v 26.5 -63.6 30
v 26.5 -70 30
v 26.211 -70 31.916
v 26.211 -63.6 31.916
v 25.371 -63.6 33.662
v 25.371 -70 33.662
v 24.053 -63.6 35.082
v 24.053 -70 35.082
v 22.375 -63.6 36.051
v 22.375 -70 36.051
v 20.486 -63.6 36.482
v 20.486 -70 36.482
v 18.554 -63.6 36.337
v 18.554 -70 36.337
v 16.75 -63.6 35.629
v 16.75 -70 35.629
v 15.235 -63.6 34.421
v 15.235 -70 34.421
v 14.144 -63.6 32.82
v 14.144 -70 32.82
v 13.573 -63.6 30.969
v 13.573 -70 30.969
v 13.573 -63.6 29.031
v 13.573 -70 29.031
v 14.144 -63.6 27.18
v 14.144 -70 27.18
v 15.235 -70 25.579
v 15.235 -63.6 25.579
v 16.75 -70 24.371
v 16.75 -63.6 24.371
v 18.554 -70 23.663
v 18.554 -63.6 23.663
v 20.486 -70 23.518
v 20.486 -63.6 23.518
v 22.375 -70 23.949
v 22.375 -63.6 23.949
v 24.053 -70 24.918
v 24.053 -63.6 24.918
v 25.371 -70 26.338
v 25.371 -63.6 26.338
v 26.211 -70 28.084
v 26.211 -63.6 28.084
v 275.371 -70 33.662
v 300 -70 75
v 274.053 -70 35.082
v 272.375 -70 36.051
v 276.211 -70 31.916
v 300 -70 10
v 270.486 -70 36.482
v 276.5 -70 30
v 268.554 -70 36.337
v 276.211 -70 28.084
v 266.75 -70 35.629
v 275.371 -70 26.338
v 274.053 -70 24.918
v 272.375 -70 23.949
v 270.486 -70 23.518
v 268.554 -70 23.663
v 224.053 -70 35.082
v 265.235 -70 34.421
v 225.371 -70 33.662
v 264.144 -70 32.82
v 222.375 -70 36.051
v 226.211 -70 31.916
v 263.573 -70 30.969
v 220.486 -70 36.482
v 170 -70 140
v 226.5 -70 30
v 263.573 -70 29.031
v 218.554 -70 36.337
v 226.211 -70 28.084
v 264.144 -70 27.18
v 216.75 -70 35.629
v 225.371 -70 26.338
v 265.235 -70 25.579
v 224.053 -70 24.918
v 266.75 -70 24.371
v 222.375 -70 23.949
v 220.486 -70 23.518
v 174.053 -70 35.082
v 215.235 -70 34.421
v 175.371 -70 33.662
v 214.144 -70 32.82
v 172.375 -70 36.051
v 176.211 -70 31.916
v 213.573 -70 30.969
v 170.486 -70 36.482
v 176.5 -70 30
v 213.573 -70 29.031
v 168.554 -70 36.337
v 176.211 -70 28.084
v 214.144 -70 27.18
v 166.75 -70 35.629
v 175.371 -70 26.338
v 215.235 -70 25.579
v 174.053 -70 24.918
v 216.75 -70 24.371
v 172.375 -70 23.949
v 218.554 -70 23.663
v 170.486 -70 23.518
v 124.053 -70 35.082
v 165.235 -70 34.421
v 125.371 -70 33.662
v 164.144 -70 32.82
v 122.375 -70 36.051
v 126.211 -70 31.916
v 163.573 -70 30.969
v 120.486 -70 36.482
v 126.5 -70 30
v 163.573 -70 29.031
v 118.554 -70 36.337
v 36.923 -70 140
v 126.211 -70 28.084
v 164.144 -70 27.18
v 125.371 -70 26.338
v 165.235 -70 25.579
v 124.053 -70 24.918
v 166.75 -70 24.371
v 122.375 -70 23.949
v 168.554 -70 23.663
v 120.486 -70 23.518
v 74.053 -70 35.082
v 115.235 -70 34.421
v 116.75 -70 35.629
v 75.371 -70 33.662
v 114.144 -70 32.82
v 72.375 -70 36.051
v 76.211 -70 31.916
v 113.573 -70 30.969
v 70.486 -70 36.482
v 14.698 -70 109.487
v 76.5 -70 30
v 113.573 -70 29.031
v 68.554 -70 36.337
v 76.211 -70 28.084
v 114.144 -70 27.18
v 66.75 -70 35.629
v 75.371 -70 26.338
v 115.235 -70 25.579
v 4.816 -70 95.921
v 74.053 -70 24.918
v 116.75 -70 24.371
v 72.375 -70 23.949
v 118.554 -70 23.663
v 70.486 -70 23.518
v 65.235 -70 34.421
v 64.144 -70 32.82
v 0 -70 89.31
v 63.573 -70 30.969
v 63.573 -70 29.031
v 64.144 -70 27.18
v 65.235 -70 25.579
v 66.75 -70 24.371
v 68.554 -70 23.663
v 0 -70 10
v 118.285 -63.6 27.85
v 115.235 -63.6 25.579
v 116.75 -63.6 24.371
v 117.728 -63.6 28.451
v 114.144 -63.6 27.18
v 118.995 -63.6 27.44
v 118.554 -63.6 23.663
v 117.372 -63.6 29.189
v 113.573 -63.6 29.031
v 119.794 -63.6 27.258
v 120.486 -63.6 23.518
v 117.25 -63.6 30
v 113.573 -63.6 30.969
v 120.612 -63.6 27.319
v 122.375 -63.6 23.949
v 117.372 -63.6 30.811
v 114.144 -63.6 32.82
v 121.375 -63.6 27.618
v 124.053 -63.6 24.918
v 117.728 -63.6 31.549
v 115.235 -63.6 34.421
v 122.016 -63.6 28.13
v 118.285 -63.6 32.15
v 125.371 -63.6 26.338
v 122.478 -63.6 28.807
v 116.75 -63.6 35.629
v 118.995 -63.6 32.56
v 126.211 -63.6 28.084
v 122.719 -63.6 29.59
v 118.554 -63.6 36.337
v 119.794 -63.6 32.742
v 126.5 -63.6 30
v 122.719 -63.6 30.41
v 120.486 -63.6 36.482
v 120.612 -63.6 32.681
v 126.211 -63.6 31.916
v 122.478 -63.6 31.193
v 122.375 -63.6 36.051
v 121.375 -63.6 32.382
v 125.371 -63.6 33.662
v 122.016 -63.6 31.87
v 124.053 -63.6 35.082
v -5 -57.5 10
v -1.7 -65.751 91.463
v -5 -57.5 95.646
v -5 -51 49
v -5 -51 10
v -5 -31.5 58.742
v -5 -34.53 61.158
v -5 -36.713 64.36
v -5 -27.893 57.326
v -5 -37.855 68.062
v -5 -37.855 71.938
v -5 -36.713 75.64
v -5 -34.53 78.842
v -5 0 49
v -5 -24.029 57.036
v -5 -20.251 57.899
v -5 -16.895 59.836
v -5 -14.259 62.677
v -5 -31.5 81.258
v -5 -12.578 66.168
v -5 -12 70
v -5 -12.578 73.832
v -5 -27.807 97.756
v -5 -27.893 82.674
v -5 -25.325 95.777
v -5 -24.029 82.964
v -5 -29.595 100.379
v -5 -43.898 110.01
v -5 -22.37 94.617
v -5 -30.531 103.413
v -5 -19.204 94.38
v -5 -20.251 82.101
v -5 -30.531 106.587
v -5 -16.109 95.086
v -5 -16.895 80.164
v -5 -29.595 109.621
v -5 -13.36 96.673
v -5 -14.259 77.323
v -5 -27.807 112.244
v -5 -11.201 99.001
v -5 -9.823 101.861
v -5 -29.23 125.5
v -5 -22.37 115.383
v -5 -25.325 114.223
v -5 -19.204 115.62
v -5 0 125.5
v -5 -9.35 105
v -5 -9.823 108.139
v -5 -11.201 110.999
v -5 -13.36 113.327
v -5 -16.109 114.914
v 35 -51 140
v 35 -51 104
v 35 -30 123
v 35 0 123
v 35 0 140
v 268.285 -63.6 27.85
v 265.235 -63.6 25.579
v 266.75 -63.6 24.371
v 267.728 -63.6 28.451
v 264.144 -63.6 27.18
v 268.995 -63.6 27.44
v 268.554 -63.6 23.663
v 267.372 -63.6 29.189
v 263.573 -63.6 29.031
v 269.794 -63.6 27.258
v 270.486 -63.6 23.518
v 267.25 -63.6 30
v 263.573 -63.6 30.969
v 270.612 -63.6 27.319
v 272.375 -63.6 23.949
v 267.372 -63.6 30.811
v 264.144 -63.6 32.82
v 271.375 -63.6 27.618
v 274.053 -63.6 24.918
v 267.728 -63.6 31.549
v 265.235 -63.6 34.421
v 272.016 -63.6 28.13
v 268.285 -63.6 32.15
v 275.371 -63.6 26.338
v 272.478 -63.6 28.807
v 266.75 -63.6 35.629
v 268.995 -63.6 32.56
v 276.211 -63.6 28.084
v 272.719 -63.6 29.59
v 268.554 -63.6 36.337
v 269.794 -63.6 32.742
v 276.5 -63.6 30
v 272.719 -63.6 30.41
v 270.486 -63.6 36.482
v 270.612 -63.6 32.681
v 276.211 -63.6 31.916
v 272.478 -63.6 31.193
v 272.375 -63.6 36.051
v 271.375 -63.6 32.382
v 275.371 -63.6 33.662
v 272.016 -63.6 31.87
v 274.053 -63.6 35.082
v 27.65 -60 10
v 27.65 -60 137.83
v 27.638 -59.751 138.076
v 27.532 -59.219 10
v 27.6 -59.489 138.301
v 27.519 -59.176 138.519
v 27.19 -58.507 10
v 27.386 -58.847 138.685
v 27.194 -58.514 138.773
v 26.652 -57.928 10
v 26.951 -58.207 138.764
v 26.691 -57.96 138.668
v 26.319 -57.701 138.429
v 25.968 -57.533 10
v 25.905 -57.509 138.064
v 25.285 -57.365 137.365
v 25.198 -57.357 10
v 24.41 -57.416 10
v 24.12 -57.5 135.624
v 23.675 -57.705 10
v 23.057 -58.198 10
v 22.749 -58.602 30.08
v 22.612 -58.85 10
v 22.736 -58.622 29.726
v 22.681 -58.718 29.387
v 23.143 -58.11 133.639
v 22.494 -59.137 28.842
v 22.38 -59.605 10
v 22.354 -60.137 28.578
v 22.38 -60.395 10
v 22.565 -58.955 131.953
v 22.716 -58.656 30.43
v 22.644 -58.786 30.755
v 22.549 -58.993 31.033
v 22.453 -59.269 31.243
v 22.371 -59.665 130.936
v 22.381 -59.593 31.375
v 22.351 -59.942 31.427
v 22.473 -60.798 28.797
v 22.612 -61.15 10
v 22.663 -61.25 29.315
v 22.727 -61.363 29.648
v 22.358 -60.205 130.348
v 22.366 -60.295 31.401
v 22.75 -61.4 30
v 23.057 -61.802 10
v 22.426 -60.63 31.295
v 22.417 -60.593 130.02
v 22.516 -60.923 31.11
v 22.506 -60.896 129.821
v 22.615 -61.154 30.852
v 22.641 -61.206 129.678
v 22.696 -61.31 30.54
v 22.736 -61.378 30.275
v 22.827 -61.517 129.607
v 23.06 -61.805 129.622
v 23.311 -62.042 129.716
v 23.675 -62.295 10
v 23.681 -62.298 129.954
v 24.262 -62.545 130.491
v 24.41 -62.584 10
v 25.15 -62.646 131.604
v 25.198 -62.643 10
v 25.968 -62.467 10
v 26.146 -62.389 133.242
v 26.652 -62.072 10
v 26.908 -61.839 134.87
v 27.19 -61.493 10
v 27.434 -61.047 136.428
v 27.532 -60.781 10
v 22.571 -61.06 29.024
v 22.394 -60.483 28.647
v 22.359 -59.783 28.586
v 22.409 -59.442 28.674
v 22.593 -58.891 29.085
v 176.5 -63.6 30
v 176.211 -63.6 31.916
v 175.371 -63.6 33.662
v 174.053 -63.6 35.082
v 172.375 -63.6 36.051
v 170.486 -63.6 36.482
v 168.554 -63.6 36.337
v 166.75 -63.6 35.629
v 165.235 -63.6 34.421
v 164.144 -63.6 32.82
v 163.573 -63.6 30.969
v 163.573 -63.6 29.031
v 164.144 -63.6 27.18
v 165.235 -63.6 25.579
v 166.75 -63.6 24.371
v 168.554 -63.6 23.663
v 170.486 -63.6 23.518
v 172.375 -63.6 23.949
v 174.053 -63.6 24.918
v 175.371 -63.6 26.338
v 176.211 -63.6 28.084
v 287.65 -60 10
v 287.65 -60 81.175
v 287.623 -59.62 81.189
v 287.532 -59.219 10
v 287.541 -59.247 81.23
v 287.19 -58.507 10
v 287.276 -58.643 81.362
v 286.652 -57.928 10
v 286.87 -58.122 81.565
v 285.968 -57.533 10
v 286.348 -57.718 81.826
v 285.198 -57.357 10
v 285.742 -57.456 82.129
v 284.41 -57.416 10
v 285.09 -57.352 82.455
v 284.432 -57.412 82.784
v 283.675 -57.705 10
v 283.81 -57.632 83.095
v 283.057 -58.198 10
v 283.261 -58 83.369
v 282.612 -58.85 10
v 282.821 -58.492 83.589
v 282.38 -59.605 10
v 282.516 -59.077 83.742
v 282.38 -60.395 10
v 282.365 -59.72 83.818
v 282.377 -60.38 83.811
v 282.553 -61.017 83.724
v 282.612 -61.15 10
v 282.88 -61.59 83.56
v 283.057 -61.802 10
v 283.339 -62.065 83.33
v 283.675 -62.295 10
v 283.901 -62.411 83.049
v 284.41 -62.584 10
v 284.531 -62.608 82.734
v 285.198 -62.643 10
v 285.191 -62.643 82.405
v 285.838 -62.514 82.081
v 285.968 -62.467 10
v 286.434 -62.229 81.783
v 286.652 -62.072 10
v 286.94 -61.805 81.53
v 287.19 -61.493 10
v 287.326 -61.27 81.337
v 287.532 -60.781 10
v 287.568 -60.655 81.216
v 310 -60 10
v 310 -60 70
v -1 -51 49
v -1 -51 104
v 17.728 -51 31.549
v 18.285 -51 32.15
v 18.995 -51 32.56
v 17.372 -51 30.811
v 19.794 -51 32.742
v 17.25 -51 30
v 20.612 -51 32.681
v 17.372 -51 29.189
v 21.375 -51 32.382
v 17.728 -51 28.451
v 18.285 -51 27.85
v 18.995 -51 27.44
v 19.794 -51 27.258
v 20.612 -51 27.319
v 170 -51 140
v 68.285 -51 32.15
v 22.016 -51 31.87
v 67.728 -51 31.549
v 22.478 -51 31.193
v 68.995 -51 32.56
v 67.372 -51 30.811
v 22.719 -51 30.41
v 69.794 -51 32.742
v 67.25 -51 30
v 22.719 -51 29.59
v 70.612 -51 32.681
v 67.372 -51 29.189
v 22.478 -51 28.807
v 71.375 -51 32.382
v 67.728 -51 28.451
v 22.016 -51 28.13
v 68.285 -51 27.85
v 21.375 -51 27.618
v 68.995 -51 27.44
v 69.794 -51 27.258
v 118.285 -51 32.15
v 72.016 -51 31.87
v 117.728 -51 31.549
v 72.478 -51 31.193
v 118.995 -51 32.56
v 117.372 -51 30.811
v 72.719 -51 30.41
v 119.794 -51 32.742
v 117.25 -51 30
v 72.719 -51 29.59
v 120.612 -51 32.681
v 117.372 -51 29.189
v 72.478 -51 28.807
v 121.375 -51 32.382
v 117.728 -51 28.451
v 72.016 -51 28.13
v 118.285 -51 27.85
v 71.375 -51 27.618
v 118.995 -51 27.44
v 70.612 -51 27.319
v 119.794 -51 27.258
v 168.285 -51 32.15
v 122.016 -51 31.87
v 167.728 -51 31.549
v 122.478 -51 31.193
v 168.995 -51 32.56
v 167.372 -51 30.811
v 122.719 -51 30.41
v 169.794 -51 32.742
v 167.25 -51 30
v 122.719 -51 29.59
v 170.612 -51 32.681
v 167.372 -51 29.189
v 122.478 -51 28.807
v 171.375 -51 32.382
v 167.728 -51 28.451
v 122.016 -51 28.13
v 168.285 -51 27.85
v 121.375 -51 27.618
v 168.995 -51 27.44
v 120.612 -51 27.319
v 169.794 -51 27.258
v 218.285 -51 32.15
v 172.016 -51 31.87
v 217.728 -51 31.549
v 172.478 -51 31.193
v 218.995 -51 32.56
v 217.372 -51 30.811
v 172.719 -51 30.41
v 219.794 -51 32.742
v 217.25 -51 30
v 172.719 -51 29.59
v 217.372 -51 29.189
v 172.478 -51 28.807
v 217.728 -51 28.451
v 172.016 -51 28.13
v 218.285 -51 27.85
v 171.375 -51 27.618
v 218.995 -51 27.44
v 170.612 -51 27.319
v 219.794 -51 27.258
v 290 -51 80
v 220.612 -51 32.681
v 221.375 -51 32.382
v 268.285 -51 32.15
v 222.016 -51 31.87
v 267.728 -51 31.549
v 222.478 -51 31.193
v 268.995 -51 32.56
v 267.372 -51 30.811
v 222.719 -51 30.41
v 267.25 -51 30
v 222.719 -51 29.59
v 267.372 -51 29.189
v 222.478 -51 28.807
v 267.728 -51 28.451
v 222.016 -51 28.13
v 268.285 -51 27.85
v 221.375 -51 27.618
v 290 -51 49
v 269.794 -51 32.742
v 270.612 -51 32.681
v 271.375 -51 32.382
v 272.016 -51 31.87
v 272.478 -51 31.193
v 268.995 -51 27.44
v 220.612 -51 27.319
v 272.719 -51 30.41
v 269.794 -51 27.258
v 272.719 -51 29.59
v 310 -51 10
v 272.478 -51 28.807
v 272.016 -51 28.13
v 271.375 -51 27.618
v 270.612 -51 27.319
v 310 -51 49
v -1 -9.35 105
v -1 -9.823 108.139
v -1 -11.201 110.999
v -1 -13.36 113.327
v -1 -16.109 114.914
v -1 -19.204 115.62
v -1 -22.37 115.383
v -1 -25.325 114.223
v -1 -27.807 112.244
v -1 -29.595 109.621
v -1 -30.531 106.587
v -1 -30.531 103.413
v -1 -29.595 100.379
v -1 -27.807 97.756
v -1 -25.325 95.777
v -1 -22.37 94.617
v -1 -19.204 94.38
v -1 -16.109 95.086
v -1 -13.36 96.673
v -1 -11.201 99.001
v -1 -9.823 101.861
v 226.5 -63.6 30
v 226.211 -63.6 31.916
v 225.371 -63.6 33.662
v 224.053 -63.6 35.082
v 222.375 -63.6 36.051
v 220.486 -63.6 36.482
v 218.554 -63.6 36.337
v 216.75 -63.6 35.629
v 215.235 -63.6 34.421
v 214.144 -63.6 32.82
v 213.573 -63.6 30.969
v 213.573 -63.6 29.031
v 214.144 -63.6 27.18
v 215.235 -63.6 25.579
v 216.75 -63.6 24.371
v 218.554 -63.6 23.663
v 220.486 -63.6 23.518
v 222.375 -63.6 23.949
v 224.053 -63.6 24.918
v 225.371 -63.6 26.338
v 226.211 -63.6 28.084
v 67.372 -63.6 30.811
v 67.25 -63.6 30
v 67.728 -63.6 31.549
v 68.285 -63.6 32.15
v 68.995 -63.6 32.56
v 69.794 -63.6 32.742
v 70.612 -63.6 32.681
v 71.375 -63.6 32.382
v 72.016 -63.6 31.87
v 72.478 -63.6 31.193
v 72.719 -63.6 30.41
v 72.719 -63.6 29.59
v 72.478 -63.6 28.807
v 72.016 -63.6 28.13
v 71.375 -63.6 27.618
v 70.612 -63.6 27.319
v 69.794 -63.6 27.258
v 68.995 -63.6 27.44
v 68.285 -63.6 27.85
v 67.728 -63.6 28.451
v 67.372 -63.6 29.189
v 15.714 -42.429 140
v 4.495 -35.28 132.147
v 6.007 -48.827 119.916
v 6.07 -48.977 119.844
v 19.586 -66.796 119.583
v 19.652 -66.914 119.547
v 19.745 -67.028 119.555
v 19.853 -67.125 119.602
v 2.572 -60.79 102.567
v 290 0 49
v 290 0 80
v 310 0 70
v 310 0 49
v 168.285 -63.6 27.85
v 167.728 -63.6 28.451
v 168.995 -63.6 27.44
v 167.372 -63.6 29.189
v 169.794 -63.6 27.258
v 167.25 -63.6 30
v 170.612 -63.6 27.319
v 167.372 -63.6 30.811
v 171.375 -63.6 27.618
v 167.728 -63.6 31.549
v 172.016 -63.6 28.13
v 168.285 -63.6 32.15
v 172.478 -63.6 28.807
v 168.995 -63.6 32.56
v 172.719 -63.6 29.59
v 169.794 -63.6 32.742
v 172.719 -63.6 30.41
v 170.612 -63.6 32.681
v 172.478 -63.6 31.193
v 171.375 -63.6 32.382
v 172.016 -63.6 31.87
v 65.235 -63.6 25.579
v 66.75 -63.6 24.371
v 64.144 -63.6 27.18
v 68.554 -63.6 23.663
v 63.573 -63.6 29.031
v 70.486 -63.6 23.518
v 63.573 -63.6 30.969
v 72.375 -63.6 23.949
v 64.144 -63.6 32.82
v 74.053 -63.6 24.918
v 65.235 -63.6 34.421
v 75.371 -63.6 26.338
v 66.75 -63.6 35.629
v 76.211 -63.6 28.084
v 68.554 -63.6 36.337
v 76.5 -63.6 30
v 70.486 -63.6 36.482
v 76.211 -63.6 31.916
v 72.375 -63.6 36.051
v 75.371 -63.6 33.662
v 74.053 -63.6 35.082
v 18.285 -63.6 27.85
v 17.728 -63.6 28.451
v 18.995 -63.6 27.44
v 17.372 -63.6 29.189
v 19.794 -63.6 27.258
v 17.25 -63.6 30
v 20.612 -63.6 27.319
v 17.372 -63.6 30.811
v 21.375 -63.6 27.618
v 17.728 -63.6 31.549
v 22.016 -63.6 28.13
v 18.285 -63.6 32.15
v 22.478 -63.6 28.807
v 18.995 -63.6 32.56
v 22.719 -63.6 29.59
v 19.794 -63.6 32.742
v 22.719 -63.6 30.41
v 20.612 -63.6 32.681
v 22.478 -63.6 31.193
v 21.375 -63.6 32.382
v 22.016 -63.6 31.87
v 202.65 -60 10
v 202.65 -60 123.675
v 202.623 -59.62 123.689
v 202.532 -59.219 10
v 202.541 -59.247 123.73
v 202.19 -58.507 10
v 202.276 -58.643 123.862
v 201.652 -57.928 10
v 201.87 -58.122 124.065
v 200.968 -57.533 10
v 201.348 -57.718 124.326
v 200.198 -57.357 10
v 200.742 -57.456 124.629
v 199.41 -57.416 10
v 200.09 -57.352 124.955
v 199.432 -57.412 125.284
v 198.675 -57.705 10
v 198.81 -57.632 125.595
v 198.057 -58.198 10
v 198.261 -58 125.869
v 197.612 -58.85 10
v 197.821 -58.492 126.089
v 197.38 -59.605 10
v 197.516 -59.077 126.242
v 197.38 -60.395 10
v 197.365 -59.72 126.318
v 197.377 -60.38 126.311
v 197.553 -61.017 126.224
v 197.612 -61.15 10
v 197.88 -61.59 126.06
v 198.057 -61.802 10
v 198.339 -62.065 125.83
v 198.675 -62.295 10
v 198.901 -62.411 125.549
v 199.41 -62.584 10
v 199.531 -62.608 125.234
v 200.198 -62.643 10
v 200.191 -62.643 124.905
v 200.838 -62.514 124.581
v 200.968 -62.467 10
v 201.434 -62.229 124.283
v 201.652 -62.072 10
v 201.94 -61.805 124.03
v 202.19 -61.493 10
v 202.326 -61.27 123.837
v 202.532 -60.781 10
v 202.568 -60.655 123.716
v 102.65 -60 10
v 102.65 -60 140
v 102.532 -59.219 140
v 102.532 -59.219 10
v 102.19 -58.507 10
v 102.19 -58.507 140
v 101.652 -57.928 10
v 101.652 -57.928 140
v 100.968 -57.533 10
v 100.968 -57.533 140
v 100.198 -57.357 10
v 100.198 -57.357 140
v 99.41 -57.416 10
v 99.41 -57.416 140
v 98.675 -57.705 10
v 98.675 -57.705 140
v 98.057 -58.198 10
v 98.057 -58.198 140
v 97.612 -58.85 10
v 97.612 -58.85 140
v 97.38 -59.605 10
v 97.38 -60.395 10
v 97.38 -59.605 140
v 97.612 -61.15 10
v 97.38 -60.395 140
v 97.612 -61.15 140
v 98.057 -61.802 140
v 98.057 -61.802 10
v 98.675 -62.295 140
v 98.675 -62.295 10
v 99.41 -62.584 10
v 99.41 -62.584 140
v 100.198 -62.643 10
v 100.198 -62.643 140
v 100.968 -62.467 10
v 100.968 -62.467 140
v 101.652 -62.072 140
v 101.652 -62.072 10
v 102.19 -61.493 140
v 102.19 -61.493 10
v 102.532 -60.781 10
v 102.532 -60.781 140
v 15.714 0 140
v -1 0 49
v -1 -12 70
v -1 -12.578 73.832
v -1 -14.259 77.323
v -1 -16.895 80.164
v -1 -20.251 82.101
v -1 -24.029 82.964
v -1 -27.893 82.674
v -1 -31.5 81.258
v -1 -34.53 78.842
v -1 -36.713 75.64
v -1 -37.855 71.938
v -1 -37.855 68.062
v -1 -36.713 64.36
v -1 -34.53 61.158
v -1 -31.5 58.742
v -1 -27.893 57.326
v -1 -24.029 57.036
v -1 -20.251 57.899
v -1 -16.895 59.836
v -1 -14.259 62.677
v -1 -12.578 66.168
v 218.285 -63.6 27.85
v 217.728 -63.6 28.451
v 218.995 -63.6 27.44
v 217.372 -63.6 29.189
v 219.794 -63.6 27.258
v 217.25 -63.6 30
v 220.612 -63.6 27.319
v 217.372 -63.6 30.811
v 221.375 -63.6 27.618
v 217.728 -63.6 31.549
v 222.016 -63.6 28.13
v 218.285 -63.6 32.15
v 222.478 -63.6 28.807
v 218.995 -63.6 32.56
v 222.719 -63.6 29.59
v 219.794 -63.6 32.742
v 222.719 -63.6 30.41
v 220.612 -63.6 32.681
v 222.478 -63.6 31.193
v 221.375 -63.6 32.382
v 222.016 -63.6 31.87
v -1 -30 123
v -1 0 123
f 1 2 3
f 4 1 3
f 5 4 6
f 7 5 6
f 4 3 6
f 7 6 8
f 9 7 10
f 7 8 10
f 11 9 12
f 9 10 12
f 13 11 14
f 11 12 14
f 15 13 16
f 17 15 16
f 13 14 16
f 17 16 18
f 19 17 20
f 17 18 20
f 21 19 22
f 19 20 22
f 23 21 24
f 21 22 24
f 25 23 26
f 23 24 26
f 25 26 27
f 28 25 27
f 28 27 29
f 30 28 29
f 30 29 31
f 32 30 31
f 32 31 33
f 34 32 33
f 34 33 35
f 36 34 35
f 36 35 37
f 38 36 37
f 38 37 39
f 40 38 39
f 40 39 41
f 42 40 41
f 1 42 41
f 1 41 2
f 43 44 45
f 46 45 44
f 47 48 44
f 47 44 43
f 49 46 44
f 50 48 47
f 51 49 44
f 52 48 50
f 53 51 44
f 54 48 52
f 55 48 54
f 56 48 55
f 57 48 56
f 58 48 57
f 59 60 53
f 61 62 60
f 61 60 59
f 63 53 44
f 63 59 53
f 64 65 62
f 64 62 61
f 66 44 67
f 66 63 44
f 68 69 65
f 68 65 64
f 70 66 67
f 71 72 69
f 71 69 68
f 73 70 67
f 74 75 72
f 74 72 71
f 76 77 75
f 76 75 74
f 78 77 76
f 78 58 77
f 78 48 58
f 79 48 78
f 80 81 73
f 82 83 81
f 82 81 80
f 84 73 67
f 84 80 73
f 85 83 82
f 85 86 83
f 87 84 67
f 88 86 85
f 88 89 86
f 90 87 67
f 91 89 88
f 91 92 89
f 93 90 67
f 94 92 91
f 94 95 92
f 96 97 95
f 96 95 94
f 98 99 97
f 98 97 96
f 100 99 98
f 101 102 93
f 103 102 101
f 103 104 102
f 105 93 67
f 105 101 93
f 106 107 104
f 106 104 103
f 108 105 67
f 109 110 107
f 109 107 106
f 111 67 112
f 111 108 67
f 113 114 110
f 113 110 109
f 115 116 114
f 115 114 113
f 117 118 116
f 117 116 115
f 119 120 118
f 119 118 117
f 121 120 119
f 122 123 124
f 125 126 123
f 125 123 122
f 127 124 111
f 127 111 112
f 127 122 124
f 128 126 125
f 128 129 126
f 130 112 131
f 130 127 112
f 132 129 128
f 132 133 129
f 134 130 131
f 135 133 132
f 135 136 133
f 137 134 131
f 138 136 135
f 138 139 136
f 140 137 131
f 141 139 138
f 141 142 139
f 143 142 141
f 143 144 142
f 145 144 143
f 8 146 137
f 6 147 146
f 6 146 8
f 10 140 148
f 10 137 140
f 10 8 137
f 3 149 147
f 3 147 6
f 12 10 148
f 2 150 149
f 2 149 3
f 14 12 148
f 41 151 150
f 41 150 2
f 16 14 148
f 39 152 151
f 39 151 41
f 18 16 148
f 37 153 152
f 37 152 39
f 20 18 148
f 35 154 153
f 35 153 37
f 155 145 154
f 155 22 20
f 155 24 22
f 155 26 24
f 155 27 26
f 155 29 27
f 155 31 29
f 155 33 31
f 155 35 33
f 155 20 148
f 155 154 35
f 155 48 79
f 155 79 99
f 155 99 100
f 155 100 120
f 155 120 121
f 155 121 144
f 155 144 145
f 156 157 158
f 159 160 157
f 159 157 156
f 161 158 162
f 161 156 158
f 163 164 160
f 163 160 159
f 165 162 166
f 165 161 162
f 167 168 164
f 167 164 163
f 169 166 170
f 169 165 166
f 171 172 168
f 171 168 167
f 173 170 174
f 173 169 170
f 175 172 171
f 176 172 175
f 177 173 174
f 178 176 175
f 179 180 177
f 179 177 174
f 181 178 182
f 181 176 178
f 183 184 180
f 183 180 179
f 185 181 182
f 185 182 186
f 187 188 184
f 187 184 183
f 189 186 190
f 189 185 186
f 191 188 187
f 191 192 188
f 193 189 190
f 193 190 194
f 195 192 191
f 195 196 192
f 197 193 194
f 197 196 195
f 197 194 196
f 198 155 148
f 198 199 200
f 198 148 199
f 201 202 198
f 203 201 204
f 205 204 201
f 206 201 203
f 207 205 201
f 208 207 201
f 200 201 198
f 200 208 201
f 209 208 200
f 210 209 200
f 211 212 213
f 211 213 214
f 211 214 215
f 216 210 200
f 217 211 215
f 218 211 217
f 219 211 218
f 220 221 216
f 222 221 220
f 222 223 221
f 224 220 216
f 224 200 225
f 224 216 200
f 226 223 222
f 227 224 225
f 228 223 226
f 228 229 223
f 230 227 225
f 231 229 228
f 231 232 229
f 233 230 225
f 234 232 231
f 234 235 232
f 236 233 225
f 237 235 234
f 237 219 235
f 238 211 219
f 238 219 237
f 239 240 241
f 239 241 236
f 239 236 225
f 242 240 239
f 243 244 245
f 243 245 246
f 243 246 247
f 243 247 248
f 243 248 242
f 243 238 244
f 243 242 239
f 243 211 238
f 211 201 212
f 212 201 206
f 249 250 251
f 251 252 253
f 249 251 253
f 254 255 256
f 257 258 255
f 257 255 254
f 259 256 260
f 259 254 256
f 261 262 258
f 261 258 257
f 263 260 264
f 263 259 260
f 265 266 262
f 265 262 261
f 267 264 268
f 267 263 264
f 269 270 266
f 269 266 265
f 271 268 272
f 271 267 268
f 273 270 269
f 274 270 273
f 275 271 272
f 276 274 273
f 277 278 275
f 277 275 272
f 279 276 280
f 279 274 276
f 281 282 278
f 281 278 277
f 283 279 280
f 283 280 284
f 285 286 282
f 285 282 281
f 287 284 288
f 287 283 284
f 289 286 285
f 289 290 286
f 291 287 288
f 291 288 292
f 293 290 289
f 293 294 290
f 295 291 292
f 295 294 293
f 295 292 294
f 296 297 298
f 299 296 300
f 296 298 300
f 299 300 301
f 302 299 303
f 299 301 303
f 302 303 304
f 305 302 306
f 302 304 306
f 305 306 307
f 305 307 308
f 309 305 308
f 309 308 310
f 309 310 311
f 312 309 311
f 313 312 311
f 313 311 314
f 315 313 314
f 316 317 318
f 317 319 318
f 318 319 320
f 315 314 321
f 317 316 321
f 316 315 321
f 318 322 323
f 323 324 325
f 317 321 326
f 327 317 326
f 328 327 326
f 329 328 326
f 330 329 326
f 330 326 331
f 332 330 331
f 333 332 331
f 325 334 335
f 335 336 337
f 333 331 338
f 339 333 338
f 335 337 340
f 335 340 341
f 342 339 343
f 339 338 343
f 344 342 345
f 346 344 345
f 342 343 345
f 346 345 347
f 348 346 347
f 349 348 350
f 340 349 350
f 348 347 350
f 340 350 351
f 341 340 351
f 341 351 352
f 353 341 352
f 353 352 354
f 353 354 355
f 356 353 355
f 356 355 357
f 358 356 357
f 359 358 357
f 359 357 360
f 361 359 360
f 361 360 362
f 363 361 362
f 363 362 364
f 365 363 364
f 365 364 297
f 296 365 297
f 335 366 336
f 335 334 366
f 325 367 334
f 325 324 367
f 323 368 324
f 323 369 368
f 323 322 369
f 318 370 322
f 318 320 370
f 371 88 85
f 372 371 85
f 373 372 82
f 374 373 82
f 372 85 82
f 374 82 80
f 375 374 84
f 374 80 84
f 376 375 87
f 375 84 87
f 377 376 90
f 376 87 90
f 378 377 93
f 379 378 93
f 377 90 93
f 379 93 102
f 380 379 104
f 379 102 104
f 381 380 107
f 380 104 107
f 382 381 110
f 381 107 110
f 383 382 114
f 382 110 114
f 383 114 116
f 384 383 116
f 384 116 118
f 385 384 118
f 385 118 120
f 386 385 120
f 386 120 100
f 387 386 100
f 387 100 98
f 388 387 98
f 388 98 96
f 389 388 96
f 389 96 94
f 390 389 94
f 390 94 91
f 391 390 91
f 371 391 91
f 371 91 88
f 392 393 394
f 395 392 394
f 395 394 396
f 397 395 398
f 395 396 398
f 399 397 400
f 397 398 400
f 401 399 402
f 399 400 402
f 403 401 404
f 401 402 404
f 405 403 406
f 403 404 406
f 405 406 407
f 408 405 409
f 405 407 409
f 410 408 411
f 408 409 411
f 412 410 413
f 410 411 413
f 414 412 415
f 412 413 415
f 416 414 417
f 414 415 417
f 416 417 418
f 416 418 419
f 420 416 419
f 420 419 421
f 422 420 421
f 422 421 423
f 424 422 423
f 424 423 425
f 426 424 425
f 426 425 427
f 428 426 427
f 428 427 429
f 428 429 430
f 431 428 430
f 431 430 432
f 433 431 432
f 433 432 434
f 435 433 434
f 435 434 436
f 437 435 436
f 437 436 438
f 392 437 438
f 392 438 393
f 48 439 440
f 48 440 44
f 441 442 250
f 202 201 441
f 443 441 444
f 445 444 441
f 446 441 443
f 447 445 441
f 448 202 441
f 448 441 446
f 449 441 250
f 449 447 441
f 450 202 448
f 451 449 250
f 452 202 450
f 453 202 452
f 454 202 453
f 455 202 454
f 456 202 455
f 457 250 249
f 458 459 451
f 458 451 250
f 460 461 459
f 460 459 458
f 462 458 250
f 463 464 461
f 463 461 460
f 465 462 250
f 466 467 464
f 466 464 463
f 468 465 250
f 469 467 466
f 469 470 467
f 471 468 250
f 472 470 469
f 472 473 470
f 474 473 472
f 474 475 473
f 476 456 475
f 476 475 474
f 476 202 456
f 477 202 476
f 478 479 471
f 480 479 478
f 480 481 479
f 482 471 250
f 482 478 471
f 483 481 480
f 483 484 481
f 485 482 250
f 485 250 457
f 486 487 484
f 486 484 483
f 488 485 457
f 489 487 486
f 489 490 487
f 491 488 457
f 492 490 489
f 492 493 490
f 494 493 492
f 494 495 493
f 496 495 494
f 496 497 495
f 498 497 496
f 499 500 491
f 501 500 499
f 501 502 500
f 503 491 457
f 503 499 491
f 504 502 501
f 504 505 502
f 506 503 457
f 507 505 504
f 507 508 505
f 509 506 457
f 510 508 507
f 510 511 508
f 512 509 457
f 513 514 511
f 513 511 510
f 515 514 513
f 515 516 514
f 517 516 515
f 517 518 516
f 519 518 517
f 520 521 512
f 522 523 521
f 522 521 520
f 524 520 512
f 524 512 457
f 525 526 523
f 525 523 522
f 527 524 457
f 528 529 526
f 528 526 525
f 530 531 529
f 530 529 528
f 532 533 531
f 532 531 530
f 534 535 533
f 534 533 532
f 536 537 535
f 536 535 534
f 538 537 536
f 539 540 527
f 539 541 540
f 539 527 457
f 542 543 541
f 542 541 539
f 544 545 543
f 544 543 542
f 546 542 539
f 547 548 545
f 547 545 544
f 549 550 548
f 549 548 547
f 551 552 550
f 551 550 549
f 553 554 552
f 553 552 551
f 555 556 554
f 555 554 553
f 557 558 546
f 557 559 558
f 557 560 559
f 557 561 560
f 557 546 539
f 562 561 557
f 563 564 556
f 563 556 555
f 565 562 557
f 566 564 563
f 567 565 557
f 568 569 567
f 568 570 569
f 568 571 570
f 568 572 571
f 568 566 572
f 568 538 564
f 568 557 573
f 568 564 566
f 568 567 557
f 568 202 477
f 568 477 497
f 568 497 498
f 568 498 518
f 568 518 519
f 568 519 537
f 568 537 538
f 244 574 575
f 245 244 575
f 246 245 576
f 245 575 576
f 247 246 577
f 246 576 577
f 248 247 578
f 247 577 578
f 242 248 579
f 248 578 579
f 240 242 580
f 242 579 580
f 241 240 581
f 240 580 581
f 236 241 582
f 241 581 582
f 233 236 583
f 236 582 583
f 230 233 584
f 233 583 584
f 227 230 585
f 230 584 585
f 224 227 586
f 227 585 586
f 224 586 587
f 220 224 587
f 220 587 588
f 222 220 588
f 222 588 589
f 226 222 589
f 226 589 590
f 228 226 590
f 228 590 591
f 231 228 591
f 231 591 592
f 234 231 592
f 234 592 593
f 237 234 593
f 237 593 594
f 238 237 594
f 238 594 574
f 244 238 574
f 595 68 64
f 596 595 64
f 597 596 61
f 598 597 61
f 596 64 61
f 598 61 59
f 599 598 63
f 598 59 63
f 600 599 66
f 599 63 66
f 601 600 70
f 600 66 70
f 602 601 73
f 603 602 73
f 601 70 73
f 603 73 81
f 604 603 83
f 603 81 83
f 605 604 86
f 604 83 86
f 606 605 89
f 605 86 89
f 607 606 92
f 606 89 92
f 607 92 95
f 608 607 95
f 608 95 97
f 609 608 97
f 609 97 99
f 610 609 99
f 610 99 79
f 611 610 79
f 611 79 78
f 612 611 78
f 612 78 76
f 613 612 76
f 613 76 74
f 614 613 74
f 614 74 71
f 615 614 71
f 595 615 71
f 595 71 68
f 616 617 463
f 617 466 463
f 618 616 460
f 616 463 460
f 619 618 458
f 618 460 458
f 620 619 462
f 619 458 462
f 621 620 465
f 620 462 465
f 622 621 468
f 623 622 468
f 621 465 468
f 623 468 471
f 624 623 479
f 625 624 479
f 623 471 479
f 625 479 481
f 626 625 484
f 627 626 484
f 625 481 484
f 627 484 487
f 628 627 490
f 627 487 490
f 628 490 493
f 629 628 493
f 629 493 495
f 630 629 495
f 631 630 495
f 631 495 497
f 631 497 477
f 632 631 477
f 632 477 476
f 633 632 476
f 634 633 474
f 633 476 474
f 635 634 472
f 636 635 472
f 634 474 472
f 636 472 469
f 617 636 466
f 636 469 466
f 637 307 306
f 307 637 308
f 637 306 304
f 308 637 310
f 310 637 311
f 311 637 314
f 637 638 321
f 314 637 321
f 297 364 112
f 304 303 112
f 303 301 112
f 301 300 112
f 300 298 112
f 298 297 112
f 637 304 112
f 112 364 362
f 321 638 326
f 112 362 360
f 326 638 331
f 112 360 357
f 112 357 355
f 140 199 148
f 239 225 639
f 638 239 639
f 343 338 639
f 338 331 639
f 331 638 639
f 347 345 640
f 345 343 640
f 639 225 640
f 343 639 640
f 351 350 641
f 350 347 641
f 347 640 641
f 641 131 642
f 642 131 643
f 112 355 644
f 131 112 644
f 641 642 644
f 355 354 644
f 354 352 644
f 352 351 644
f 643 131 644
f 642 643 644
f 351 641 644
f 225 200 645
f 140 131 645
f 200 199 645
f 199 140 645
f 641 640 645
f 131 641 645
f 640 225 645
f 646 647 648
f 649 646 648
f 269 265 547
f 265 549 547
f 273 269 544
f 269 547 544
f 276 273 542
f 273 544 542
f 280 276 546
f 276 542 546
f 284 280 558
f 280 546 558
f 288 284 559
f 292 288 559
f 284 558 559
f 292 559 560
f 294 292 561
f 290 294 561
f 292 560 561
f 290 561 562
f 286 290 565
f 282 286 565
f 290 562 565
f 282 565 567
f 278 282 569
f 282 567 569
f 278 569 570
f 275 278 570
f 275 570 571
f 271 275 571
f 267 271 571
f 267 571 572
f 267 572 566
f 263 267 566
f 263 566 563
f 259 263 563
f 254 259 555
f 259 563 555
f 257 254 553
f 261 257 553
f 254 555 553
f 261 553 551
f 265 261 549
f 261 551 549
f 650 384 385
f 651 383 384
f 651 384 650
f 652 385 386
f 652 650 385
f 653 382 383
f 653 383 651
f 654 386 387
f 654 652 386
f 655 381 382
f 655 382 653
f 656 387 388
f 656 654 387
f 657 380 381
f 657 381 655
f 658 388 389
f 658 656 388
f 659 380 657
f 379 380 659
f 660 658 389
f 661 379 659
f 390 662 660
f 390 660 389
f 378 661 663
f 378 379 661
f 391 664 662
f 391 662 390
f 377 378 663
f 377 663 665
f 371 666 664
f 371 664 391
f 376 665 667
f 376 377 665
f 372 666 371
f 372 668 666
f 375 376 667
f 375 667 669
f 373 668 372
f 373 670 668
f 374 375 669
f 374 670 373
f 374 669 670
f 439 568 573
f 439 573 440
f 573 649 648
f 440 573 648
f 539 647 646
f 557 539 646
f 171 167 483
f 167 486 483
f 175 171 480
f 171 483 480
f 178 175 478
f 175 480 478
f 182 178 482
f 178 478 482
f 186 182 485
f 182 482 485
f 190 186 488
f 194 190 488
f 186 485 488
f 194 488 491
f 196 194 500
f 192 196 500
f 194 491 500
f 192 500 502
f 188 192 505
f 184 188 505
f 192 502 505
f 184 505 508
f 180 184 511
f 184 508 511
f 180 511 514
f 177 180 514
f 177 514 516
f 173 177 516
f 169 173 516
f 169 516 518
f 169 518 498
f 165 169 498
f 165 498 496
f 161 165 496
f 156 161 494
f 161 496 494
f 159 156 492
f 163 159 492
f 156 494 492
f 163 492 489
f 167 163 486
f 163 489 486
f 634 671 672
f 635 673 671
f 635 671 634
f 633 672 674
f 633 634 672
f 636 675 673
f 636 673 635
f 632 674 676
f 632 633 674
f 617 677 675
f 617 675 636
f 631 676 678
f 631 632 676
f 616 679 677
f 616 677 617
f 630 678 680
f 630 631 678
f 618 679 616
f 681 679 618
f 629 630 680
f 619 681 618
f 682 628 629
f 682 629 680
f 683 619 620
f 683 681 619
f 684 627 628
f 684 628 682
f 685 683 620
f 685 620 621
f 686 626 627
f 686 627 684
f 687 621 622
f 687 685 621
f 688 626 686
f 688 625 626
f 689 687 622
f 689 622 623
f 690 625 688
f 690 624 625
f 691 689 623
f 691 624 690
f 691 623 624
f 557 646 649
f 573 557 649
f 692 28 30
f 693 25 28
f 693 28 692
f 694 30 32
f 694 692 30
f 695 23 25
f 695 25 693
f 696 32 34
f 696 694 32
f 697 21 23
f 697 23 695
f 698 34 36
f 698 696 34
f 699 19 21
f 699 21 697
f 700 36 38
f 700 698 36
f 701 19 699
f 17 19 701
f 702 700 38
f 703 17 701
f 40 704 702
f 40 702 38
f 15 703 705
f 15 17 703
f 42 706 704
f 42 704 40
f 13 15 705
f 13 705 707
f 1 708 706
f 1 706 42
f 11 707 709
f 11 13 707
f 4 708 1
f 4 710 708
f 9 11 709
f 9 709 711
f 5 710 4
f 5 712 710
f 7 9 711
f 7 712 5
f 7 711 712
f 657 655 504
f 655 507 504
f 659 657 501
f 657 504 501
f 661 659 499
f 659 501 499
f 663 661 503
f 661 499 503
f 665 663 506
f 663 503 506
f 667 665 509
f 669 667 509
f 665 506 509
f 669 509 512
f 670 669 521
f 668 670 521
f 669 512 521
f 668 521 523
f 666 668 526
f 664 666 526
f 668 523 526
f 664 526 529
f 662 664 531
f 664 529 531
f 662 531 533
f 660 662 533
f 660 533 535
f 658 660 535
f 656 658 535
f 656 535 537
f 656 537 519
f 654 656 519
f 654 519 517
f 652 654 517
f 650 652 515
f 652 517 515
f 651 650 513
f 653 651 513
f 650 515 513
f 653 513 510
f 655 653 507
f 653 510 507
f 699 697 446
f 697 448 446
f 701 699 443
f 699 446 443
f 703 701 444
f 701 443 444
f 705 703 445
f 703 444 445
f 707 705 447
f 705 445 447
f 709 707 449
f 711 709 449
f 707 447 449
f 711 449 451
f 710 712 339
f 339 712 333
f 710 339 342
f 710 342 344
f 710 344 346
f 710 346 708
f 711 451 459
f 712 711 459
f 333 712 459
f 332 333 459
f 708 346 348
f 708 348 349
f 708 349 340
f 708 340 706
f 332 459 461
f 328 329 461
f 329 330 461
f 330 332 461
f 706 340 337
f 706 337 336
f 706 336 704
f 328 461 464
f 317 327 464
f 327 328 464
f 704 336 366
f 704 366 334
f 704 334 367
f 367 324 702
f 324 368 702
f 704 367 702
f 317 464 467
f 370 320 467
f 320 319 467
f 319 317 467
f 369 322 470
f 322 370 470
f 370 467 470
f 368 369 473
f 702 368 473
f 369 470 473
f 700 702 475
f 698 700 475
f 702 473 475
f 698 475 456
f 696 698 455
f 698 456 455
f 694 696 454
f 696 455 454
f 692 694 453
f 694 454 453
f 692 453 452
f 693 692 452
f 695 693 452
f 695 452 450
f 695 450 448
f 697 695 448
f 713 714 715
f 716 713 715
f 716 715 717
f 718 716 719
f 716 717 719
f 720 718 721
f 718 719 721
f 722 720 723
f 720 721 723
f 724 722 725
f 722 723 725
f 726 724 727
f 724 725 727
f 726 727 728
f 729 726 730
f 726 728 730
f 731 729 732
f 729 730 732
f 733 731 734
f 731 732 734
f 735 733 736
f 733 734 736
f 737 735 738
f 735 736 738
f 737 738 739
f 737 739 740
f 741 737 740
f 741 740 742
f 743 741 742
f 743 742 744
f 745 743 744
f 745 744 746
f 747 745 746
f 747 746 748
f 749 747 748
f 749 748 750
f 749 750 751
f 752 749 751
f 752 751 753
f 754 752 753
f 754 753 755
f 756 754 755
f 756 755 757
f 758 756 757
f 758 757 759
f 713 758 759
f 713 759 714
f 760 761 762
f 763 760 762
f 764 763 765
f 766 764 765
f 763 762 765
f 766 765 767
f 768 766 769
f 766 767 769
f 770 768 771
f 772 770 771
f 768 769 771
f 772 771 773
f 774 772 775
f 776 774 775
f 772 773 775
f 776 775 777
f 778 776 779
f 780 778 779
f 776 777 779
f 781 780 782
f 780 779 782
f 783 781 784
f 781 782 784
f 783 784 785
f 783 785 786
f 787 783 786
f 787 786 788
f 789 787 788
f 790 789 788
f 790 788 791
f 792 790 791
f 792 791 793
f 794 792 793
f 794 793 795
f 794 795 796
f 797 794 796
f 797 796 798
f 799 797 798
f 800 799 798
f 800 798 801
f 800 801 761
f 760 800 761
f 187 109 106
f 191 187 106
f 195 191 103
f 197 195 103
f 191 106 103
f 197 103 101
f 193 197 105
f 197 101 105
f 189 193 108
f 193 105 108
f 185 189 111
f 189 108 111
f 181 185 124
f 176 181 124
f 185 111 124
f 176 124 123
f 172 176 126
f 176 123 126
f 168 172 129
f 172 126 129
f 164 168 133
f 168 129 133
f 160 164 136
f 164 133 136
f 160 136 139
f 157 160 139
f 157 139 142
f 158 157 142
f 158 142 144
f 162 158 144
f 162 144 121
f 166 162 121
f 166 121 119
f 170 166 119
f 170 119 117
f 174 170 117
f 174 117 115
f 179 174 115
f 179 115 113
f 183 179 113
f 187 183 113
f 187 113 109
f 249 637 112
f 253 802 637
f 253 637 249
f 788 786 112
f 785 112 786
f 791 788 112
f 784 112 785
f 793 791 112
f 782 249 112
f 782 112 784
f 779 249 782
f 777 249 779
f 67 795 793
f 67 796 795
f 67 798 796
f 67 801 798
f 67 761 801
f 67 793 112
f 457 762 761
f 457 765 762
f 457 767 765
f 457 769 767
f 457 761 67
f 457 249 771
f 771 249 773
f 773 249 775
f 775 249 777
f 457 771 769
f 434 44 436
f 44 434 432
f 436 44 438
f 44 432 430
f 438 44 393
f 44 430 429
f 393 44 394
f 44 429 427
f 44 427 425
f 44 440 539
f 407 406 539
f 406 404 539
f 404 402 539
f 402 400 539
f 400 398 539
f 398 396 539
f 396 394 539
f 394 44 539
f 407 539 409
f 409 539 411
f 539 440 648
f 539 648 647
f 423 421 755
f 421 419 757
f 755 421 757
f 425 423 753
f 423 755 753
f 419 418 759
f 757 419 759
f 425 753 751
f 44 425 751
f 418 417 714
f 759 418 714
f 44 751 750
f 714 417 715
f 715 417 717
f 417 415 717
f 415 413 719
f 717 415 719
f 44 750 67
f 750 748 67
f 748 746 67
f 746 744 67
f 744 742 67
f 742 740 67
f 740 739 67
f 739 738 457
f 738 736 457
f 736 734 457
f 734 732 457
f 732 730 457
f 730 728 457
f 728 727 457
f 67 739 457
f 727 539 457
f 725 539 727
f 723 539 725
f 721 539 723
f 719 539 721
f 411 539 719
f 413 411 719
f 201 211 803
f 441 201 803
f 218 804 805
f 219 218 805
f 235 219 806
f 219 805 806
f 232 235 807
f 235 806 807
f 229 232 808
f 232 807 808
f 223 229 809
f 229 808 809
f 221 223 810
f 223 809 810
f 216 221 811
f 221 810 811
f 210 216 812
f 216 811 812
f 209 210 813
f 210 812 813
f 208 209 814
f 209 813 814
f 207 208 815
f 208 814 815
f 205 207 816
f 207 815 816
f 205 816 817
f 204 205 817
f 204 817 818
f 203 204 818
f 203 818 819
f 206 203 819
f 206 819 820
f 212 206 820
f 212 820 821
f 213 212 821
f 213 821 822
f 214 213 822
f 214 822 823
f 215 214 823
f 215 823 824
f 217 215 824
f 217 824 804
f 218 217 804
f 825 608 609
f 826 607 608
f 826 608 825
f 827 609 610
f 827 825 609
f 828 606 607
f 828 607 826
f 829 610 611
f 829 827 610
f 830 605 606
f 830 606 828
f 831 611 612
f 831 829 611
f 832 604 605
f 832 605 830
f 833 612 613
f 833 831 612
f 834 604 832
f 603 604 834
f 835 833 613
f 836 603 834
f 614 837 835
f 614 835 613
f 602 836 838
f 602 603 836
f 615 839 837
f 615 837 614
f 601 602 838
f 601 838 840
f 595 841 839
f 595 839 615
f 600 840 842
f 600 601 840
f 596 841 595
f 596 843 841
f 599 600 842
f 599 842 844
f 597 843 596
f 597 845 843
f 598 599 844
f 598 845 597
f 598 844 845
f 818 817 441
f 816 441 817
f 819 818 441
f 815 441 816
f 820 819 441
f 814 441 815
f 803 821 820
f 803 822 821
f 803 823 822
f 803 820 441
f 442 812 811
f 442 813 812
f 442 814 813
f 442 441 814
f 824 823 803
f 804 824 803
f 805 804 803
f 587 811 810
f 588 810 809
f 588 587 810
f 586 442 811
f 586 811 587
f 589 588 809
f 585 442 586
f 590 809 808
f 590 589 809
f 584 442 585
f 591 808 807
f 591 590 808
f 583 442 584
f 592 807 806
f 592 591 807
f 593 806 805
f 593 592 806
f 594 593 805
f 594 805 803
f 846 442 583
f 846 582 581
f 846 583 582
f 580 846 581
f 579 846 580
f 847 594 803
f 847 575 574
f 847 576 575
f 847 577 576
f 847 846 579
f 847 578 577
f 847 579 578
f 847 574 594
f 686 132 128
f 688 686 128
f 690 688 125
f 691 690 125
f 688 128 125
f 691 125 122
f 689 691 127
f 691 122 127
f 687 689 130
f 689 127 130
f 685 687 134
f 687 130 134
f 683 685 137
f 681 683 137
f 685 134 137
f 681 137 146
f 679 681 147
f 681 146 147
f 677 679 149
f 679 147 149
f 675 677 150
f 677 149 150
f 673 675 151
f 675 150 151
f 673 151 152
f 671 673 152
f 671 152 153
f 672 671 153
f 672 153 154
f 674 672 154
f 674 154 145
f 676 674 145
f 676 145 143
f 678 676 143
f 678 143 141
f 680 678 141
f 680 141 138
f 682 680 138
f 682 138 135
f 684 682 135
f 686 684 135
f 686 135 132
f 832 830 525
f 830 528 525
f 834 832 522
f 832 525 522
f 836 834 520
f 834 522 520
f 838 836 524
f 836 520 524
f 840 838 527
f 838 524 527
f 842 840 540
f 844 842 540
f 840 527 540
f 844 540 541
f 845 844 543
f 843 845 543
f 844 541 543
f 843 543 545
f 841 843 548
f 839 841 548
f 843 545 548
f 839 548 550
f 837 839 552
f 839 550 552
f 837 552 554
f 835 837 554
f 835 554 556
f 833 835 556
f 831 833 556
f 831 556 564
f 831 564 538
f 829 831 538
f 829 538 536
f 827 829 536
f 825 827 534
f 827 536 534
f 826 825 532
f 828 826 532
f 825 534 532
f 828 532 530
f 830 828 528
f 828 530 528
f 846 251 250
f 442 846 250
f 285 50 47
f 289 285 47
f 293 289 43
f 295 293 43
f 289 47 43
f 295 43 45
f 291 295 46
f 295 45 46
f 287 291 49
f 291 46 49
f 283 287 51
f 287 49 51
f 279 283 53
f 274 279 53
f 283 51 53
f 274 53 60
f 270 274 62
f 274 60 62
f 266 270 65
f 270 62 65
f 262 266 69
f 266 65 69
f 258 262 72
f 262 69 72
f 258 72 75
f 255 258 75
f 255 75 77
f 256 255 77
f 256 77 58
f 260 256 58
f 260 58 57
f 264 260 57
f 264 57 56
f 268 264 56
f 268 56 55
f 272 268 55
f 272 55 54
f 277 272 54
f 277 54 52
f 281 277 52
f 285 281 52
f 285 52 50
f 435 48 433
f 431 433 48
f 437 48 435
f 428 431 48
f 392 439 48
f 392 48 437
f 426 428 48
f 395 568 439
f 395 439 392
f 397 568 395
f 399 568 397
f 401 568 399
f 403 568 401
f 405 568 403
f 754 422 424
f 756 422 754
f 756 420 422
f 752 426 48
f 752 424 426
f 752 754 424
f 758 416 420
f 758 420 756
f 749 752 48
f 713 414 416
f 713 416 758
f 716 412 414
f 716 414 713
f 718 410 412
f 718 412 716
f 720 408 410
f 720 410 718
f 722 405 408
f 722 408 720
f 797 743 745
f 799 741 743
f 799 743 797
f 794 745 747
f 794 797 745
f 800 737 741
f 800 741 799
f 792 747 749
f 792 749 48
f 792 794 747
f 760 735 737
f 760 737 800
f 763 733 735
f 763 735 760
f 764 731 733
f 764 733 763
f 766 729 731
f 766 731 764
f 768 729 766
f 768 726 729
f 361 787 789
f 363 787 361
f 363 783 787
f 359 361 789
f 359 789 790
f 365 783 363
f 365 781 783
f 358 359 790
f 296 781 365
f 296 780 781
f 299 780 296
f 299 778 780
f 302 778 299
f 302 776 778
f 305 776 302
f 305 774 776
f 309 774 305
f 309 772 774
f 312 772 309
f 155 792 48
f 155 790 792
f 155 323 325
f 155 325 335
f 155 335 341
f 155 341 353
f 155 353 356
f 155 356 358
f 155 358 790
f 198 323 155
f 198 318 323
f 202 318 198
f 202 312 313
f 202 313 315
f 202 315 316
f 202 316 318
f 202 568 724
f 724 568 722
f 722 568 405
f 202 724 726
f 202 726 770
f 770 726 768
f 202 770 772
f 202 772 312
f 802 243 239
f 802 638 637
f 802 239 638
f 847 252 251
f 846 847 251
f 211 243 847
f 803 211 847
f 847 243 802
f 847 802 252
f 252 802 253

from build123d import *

# Parameters (mm, degrees)
PAD002_DEPTH        = 130
POCKET001_DEPTH     = 77
SKETCH007_R         = 2.65
HOLE002_DEPTH       = 150.001
HOLE003_D           = 5.5
HOLE003_DEPTH       = 25
HOLE003_CBORE_D     = 13
HOLE003_CBORE_DEPTH = 6.4
SKETCH011_W         = 40
SKETCH011_H         = 91
PAD003_DEPTH        = 55
POCKET002_DEPTH     = 55
POCKET002_TAPER     = 30
POCKET005_DEPTH     = 36
PAD007_DEPTH        = 54
SKETCH030_R         = 13
SKETCH030_R_2       = 10.65
POCKET010_DEPTH     = 5
POCKET012_DEPTH     = 104


with BuildPart() as part:
    # Sketch005 → Pad002 (new body)
    with BuildSketch(Plane.XY):
        Polygon((300, -70), (0, -70), (-5, -57.5), (-5, -51), (310, -51), (310, -60), align=None)
    extrude(amount=PAD002_DEPTH)

    # Sketch006 → Pocket001 (cut)
    with BuildSketch(Plane.XZ):
        Polygon((310, 60), (130, 150), (310, 150), align=None)
    extrude(amount=POCKET001_DEPTH, mode=Mode.SUBTRACT)

    # Sketch007 → Hole002 (cut, through all)
    with BuildSketch(Plane.XY.offset(150)):
        with Locations((100, -60)):
            Circle(SKETCH007_R)
        with Locations((200, -60)):
            Circle(SKETCH007_R)
        with Locations((285, -60)):
            Circle(SKETCH007_R)
        with Locations((25, -60)):
            Circle(SKETCH007_R)
    extrude(amount=-HOLE002_DEPTH, mode=Mode.SUBTRACT)

    # Hole003
    with Locations(Plane.XZ.offset(70)):
        with Locations((20, 20), (70, 20), (120, 20), (170, 20), (220, 20), (270, 20)):
            CounterBoreHole(HOLE003_D / 2, HOLE003_CBORE_D / 2, HOLE003_CBORE_DEPTH, depth=HOLE003_DEPTH)

    # Sketch011 → Pad003 (join)
    with BuildSketch(Plane.XZ):
        with Locations((15, 84.5)):
            Rectangle(SKETCH011_W, SKETCH011_H)
    extrude(amount=PAD003_DEPTH)

    # Sketch013 → Pocket002 (cut)
    with BuildSketch(Plane.XY.offset(130)):
        Polygon((-40, 30), (60, -100), (-40, -100), align=None)
    extrude(amount=-POCKET002_DEPTH, taper=POCKET002_TAPER, mode=Mode.SUBTRACT)

    # Sketch017 → Pocket005 (cut)
    with BuildSketch(Plane.YZ.offset(35)):
        Polygon((-51, 30), (0, 30), (0, 113), (-30, 113), (-51, 94), align=None)
    extrude(amount=-POCKET005_DEPTH, mode=Mode.SUBTRACT)

    # Sketch019 → Pad007 (join)
    with BuildSketch(Plane.XZ):
        Polygon((290, 70), (290, 39), (310, 39), (310, 60), align=None)
    extrude(amount=PAD007_DEPTH)

    # Sketch030 → Pocket010 (cut)
    with BuildSketch(Plane.YZ):
        with Locations((-25, 60)):
            Circle(SKETCH030_R)
        with Locations((-20, 95)):
            Circle(SKETCH030_R_2)
    extrude(amount=-POCKET010_DEPTH, mode=Mode.SUBTRACT)

    # Sketch135 → Pocket012 (cut)
    with BuildSketch(Plane.XZ):
        Polygon((-20, 140), (-20, 105), (30, 140), align=None)
    extrude(amount=POCKET012_DEPTH, mode=Mode.SUBTRACT)


with BuildPart() as part_1:
    # Body002 placement: moved
    add(part.part.moved(Location((0, 0, 10))))


solid = part_1.part
